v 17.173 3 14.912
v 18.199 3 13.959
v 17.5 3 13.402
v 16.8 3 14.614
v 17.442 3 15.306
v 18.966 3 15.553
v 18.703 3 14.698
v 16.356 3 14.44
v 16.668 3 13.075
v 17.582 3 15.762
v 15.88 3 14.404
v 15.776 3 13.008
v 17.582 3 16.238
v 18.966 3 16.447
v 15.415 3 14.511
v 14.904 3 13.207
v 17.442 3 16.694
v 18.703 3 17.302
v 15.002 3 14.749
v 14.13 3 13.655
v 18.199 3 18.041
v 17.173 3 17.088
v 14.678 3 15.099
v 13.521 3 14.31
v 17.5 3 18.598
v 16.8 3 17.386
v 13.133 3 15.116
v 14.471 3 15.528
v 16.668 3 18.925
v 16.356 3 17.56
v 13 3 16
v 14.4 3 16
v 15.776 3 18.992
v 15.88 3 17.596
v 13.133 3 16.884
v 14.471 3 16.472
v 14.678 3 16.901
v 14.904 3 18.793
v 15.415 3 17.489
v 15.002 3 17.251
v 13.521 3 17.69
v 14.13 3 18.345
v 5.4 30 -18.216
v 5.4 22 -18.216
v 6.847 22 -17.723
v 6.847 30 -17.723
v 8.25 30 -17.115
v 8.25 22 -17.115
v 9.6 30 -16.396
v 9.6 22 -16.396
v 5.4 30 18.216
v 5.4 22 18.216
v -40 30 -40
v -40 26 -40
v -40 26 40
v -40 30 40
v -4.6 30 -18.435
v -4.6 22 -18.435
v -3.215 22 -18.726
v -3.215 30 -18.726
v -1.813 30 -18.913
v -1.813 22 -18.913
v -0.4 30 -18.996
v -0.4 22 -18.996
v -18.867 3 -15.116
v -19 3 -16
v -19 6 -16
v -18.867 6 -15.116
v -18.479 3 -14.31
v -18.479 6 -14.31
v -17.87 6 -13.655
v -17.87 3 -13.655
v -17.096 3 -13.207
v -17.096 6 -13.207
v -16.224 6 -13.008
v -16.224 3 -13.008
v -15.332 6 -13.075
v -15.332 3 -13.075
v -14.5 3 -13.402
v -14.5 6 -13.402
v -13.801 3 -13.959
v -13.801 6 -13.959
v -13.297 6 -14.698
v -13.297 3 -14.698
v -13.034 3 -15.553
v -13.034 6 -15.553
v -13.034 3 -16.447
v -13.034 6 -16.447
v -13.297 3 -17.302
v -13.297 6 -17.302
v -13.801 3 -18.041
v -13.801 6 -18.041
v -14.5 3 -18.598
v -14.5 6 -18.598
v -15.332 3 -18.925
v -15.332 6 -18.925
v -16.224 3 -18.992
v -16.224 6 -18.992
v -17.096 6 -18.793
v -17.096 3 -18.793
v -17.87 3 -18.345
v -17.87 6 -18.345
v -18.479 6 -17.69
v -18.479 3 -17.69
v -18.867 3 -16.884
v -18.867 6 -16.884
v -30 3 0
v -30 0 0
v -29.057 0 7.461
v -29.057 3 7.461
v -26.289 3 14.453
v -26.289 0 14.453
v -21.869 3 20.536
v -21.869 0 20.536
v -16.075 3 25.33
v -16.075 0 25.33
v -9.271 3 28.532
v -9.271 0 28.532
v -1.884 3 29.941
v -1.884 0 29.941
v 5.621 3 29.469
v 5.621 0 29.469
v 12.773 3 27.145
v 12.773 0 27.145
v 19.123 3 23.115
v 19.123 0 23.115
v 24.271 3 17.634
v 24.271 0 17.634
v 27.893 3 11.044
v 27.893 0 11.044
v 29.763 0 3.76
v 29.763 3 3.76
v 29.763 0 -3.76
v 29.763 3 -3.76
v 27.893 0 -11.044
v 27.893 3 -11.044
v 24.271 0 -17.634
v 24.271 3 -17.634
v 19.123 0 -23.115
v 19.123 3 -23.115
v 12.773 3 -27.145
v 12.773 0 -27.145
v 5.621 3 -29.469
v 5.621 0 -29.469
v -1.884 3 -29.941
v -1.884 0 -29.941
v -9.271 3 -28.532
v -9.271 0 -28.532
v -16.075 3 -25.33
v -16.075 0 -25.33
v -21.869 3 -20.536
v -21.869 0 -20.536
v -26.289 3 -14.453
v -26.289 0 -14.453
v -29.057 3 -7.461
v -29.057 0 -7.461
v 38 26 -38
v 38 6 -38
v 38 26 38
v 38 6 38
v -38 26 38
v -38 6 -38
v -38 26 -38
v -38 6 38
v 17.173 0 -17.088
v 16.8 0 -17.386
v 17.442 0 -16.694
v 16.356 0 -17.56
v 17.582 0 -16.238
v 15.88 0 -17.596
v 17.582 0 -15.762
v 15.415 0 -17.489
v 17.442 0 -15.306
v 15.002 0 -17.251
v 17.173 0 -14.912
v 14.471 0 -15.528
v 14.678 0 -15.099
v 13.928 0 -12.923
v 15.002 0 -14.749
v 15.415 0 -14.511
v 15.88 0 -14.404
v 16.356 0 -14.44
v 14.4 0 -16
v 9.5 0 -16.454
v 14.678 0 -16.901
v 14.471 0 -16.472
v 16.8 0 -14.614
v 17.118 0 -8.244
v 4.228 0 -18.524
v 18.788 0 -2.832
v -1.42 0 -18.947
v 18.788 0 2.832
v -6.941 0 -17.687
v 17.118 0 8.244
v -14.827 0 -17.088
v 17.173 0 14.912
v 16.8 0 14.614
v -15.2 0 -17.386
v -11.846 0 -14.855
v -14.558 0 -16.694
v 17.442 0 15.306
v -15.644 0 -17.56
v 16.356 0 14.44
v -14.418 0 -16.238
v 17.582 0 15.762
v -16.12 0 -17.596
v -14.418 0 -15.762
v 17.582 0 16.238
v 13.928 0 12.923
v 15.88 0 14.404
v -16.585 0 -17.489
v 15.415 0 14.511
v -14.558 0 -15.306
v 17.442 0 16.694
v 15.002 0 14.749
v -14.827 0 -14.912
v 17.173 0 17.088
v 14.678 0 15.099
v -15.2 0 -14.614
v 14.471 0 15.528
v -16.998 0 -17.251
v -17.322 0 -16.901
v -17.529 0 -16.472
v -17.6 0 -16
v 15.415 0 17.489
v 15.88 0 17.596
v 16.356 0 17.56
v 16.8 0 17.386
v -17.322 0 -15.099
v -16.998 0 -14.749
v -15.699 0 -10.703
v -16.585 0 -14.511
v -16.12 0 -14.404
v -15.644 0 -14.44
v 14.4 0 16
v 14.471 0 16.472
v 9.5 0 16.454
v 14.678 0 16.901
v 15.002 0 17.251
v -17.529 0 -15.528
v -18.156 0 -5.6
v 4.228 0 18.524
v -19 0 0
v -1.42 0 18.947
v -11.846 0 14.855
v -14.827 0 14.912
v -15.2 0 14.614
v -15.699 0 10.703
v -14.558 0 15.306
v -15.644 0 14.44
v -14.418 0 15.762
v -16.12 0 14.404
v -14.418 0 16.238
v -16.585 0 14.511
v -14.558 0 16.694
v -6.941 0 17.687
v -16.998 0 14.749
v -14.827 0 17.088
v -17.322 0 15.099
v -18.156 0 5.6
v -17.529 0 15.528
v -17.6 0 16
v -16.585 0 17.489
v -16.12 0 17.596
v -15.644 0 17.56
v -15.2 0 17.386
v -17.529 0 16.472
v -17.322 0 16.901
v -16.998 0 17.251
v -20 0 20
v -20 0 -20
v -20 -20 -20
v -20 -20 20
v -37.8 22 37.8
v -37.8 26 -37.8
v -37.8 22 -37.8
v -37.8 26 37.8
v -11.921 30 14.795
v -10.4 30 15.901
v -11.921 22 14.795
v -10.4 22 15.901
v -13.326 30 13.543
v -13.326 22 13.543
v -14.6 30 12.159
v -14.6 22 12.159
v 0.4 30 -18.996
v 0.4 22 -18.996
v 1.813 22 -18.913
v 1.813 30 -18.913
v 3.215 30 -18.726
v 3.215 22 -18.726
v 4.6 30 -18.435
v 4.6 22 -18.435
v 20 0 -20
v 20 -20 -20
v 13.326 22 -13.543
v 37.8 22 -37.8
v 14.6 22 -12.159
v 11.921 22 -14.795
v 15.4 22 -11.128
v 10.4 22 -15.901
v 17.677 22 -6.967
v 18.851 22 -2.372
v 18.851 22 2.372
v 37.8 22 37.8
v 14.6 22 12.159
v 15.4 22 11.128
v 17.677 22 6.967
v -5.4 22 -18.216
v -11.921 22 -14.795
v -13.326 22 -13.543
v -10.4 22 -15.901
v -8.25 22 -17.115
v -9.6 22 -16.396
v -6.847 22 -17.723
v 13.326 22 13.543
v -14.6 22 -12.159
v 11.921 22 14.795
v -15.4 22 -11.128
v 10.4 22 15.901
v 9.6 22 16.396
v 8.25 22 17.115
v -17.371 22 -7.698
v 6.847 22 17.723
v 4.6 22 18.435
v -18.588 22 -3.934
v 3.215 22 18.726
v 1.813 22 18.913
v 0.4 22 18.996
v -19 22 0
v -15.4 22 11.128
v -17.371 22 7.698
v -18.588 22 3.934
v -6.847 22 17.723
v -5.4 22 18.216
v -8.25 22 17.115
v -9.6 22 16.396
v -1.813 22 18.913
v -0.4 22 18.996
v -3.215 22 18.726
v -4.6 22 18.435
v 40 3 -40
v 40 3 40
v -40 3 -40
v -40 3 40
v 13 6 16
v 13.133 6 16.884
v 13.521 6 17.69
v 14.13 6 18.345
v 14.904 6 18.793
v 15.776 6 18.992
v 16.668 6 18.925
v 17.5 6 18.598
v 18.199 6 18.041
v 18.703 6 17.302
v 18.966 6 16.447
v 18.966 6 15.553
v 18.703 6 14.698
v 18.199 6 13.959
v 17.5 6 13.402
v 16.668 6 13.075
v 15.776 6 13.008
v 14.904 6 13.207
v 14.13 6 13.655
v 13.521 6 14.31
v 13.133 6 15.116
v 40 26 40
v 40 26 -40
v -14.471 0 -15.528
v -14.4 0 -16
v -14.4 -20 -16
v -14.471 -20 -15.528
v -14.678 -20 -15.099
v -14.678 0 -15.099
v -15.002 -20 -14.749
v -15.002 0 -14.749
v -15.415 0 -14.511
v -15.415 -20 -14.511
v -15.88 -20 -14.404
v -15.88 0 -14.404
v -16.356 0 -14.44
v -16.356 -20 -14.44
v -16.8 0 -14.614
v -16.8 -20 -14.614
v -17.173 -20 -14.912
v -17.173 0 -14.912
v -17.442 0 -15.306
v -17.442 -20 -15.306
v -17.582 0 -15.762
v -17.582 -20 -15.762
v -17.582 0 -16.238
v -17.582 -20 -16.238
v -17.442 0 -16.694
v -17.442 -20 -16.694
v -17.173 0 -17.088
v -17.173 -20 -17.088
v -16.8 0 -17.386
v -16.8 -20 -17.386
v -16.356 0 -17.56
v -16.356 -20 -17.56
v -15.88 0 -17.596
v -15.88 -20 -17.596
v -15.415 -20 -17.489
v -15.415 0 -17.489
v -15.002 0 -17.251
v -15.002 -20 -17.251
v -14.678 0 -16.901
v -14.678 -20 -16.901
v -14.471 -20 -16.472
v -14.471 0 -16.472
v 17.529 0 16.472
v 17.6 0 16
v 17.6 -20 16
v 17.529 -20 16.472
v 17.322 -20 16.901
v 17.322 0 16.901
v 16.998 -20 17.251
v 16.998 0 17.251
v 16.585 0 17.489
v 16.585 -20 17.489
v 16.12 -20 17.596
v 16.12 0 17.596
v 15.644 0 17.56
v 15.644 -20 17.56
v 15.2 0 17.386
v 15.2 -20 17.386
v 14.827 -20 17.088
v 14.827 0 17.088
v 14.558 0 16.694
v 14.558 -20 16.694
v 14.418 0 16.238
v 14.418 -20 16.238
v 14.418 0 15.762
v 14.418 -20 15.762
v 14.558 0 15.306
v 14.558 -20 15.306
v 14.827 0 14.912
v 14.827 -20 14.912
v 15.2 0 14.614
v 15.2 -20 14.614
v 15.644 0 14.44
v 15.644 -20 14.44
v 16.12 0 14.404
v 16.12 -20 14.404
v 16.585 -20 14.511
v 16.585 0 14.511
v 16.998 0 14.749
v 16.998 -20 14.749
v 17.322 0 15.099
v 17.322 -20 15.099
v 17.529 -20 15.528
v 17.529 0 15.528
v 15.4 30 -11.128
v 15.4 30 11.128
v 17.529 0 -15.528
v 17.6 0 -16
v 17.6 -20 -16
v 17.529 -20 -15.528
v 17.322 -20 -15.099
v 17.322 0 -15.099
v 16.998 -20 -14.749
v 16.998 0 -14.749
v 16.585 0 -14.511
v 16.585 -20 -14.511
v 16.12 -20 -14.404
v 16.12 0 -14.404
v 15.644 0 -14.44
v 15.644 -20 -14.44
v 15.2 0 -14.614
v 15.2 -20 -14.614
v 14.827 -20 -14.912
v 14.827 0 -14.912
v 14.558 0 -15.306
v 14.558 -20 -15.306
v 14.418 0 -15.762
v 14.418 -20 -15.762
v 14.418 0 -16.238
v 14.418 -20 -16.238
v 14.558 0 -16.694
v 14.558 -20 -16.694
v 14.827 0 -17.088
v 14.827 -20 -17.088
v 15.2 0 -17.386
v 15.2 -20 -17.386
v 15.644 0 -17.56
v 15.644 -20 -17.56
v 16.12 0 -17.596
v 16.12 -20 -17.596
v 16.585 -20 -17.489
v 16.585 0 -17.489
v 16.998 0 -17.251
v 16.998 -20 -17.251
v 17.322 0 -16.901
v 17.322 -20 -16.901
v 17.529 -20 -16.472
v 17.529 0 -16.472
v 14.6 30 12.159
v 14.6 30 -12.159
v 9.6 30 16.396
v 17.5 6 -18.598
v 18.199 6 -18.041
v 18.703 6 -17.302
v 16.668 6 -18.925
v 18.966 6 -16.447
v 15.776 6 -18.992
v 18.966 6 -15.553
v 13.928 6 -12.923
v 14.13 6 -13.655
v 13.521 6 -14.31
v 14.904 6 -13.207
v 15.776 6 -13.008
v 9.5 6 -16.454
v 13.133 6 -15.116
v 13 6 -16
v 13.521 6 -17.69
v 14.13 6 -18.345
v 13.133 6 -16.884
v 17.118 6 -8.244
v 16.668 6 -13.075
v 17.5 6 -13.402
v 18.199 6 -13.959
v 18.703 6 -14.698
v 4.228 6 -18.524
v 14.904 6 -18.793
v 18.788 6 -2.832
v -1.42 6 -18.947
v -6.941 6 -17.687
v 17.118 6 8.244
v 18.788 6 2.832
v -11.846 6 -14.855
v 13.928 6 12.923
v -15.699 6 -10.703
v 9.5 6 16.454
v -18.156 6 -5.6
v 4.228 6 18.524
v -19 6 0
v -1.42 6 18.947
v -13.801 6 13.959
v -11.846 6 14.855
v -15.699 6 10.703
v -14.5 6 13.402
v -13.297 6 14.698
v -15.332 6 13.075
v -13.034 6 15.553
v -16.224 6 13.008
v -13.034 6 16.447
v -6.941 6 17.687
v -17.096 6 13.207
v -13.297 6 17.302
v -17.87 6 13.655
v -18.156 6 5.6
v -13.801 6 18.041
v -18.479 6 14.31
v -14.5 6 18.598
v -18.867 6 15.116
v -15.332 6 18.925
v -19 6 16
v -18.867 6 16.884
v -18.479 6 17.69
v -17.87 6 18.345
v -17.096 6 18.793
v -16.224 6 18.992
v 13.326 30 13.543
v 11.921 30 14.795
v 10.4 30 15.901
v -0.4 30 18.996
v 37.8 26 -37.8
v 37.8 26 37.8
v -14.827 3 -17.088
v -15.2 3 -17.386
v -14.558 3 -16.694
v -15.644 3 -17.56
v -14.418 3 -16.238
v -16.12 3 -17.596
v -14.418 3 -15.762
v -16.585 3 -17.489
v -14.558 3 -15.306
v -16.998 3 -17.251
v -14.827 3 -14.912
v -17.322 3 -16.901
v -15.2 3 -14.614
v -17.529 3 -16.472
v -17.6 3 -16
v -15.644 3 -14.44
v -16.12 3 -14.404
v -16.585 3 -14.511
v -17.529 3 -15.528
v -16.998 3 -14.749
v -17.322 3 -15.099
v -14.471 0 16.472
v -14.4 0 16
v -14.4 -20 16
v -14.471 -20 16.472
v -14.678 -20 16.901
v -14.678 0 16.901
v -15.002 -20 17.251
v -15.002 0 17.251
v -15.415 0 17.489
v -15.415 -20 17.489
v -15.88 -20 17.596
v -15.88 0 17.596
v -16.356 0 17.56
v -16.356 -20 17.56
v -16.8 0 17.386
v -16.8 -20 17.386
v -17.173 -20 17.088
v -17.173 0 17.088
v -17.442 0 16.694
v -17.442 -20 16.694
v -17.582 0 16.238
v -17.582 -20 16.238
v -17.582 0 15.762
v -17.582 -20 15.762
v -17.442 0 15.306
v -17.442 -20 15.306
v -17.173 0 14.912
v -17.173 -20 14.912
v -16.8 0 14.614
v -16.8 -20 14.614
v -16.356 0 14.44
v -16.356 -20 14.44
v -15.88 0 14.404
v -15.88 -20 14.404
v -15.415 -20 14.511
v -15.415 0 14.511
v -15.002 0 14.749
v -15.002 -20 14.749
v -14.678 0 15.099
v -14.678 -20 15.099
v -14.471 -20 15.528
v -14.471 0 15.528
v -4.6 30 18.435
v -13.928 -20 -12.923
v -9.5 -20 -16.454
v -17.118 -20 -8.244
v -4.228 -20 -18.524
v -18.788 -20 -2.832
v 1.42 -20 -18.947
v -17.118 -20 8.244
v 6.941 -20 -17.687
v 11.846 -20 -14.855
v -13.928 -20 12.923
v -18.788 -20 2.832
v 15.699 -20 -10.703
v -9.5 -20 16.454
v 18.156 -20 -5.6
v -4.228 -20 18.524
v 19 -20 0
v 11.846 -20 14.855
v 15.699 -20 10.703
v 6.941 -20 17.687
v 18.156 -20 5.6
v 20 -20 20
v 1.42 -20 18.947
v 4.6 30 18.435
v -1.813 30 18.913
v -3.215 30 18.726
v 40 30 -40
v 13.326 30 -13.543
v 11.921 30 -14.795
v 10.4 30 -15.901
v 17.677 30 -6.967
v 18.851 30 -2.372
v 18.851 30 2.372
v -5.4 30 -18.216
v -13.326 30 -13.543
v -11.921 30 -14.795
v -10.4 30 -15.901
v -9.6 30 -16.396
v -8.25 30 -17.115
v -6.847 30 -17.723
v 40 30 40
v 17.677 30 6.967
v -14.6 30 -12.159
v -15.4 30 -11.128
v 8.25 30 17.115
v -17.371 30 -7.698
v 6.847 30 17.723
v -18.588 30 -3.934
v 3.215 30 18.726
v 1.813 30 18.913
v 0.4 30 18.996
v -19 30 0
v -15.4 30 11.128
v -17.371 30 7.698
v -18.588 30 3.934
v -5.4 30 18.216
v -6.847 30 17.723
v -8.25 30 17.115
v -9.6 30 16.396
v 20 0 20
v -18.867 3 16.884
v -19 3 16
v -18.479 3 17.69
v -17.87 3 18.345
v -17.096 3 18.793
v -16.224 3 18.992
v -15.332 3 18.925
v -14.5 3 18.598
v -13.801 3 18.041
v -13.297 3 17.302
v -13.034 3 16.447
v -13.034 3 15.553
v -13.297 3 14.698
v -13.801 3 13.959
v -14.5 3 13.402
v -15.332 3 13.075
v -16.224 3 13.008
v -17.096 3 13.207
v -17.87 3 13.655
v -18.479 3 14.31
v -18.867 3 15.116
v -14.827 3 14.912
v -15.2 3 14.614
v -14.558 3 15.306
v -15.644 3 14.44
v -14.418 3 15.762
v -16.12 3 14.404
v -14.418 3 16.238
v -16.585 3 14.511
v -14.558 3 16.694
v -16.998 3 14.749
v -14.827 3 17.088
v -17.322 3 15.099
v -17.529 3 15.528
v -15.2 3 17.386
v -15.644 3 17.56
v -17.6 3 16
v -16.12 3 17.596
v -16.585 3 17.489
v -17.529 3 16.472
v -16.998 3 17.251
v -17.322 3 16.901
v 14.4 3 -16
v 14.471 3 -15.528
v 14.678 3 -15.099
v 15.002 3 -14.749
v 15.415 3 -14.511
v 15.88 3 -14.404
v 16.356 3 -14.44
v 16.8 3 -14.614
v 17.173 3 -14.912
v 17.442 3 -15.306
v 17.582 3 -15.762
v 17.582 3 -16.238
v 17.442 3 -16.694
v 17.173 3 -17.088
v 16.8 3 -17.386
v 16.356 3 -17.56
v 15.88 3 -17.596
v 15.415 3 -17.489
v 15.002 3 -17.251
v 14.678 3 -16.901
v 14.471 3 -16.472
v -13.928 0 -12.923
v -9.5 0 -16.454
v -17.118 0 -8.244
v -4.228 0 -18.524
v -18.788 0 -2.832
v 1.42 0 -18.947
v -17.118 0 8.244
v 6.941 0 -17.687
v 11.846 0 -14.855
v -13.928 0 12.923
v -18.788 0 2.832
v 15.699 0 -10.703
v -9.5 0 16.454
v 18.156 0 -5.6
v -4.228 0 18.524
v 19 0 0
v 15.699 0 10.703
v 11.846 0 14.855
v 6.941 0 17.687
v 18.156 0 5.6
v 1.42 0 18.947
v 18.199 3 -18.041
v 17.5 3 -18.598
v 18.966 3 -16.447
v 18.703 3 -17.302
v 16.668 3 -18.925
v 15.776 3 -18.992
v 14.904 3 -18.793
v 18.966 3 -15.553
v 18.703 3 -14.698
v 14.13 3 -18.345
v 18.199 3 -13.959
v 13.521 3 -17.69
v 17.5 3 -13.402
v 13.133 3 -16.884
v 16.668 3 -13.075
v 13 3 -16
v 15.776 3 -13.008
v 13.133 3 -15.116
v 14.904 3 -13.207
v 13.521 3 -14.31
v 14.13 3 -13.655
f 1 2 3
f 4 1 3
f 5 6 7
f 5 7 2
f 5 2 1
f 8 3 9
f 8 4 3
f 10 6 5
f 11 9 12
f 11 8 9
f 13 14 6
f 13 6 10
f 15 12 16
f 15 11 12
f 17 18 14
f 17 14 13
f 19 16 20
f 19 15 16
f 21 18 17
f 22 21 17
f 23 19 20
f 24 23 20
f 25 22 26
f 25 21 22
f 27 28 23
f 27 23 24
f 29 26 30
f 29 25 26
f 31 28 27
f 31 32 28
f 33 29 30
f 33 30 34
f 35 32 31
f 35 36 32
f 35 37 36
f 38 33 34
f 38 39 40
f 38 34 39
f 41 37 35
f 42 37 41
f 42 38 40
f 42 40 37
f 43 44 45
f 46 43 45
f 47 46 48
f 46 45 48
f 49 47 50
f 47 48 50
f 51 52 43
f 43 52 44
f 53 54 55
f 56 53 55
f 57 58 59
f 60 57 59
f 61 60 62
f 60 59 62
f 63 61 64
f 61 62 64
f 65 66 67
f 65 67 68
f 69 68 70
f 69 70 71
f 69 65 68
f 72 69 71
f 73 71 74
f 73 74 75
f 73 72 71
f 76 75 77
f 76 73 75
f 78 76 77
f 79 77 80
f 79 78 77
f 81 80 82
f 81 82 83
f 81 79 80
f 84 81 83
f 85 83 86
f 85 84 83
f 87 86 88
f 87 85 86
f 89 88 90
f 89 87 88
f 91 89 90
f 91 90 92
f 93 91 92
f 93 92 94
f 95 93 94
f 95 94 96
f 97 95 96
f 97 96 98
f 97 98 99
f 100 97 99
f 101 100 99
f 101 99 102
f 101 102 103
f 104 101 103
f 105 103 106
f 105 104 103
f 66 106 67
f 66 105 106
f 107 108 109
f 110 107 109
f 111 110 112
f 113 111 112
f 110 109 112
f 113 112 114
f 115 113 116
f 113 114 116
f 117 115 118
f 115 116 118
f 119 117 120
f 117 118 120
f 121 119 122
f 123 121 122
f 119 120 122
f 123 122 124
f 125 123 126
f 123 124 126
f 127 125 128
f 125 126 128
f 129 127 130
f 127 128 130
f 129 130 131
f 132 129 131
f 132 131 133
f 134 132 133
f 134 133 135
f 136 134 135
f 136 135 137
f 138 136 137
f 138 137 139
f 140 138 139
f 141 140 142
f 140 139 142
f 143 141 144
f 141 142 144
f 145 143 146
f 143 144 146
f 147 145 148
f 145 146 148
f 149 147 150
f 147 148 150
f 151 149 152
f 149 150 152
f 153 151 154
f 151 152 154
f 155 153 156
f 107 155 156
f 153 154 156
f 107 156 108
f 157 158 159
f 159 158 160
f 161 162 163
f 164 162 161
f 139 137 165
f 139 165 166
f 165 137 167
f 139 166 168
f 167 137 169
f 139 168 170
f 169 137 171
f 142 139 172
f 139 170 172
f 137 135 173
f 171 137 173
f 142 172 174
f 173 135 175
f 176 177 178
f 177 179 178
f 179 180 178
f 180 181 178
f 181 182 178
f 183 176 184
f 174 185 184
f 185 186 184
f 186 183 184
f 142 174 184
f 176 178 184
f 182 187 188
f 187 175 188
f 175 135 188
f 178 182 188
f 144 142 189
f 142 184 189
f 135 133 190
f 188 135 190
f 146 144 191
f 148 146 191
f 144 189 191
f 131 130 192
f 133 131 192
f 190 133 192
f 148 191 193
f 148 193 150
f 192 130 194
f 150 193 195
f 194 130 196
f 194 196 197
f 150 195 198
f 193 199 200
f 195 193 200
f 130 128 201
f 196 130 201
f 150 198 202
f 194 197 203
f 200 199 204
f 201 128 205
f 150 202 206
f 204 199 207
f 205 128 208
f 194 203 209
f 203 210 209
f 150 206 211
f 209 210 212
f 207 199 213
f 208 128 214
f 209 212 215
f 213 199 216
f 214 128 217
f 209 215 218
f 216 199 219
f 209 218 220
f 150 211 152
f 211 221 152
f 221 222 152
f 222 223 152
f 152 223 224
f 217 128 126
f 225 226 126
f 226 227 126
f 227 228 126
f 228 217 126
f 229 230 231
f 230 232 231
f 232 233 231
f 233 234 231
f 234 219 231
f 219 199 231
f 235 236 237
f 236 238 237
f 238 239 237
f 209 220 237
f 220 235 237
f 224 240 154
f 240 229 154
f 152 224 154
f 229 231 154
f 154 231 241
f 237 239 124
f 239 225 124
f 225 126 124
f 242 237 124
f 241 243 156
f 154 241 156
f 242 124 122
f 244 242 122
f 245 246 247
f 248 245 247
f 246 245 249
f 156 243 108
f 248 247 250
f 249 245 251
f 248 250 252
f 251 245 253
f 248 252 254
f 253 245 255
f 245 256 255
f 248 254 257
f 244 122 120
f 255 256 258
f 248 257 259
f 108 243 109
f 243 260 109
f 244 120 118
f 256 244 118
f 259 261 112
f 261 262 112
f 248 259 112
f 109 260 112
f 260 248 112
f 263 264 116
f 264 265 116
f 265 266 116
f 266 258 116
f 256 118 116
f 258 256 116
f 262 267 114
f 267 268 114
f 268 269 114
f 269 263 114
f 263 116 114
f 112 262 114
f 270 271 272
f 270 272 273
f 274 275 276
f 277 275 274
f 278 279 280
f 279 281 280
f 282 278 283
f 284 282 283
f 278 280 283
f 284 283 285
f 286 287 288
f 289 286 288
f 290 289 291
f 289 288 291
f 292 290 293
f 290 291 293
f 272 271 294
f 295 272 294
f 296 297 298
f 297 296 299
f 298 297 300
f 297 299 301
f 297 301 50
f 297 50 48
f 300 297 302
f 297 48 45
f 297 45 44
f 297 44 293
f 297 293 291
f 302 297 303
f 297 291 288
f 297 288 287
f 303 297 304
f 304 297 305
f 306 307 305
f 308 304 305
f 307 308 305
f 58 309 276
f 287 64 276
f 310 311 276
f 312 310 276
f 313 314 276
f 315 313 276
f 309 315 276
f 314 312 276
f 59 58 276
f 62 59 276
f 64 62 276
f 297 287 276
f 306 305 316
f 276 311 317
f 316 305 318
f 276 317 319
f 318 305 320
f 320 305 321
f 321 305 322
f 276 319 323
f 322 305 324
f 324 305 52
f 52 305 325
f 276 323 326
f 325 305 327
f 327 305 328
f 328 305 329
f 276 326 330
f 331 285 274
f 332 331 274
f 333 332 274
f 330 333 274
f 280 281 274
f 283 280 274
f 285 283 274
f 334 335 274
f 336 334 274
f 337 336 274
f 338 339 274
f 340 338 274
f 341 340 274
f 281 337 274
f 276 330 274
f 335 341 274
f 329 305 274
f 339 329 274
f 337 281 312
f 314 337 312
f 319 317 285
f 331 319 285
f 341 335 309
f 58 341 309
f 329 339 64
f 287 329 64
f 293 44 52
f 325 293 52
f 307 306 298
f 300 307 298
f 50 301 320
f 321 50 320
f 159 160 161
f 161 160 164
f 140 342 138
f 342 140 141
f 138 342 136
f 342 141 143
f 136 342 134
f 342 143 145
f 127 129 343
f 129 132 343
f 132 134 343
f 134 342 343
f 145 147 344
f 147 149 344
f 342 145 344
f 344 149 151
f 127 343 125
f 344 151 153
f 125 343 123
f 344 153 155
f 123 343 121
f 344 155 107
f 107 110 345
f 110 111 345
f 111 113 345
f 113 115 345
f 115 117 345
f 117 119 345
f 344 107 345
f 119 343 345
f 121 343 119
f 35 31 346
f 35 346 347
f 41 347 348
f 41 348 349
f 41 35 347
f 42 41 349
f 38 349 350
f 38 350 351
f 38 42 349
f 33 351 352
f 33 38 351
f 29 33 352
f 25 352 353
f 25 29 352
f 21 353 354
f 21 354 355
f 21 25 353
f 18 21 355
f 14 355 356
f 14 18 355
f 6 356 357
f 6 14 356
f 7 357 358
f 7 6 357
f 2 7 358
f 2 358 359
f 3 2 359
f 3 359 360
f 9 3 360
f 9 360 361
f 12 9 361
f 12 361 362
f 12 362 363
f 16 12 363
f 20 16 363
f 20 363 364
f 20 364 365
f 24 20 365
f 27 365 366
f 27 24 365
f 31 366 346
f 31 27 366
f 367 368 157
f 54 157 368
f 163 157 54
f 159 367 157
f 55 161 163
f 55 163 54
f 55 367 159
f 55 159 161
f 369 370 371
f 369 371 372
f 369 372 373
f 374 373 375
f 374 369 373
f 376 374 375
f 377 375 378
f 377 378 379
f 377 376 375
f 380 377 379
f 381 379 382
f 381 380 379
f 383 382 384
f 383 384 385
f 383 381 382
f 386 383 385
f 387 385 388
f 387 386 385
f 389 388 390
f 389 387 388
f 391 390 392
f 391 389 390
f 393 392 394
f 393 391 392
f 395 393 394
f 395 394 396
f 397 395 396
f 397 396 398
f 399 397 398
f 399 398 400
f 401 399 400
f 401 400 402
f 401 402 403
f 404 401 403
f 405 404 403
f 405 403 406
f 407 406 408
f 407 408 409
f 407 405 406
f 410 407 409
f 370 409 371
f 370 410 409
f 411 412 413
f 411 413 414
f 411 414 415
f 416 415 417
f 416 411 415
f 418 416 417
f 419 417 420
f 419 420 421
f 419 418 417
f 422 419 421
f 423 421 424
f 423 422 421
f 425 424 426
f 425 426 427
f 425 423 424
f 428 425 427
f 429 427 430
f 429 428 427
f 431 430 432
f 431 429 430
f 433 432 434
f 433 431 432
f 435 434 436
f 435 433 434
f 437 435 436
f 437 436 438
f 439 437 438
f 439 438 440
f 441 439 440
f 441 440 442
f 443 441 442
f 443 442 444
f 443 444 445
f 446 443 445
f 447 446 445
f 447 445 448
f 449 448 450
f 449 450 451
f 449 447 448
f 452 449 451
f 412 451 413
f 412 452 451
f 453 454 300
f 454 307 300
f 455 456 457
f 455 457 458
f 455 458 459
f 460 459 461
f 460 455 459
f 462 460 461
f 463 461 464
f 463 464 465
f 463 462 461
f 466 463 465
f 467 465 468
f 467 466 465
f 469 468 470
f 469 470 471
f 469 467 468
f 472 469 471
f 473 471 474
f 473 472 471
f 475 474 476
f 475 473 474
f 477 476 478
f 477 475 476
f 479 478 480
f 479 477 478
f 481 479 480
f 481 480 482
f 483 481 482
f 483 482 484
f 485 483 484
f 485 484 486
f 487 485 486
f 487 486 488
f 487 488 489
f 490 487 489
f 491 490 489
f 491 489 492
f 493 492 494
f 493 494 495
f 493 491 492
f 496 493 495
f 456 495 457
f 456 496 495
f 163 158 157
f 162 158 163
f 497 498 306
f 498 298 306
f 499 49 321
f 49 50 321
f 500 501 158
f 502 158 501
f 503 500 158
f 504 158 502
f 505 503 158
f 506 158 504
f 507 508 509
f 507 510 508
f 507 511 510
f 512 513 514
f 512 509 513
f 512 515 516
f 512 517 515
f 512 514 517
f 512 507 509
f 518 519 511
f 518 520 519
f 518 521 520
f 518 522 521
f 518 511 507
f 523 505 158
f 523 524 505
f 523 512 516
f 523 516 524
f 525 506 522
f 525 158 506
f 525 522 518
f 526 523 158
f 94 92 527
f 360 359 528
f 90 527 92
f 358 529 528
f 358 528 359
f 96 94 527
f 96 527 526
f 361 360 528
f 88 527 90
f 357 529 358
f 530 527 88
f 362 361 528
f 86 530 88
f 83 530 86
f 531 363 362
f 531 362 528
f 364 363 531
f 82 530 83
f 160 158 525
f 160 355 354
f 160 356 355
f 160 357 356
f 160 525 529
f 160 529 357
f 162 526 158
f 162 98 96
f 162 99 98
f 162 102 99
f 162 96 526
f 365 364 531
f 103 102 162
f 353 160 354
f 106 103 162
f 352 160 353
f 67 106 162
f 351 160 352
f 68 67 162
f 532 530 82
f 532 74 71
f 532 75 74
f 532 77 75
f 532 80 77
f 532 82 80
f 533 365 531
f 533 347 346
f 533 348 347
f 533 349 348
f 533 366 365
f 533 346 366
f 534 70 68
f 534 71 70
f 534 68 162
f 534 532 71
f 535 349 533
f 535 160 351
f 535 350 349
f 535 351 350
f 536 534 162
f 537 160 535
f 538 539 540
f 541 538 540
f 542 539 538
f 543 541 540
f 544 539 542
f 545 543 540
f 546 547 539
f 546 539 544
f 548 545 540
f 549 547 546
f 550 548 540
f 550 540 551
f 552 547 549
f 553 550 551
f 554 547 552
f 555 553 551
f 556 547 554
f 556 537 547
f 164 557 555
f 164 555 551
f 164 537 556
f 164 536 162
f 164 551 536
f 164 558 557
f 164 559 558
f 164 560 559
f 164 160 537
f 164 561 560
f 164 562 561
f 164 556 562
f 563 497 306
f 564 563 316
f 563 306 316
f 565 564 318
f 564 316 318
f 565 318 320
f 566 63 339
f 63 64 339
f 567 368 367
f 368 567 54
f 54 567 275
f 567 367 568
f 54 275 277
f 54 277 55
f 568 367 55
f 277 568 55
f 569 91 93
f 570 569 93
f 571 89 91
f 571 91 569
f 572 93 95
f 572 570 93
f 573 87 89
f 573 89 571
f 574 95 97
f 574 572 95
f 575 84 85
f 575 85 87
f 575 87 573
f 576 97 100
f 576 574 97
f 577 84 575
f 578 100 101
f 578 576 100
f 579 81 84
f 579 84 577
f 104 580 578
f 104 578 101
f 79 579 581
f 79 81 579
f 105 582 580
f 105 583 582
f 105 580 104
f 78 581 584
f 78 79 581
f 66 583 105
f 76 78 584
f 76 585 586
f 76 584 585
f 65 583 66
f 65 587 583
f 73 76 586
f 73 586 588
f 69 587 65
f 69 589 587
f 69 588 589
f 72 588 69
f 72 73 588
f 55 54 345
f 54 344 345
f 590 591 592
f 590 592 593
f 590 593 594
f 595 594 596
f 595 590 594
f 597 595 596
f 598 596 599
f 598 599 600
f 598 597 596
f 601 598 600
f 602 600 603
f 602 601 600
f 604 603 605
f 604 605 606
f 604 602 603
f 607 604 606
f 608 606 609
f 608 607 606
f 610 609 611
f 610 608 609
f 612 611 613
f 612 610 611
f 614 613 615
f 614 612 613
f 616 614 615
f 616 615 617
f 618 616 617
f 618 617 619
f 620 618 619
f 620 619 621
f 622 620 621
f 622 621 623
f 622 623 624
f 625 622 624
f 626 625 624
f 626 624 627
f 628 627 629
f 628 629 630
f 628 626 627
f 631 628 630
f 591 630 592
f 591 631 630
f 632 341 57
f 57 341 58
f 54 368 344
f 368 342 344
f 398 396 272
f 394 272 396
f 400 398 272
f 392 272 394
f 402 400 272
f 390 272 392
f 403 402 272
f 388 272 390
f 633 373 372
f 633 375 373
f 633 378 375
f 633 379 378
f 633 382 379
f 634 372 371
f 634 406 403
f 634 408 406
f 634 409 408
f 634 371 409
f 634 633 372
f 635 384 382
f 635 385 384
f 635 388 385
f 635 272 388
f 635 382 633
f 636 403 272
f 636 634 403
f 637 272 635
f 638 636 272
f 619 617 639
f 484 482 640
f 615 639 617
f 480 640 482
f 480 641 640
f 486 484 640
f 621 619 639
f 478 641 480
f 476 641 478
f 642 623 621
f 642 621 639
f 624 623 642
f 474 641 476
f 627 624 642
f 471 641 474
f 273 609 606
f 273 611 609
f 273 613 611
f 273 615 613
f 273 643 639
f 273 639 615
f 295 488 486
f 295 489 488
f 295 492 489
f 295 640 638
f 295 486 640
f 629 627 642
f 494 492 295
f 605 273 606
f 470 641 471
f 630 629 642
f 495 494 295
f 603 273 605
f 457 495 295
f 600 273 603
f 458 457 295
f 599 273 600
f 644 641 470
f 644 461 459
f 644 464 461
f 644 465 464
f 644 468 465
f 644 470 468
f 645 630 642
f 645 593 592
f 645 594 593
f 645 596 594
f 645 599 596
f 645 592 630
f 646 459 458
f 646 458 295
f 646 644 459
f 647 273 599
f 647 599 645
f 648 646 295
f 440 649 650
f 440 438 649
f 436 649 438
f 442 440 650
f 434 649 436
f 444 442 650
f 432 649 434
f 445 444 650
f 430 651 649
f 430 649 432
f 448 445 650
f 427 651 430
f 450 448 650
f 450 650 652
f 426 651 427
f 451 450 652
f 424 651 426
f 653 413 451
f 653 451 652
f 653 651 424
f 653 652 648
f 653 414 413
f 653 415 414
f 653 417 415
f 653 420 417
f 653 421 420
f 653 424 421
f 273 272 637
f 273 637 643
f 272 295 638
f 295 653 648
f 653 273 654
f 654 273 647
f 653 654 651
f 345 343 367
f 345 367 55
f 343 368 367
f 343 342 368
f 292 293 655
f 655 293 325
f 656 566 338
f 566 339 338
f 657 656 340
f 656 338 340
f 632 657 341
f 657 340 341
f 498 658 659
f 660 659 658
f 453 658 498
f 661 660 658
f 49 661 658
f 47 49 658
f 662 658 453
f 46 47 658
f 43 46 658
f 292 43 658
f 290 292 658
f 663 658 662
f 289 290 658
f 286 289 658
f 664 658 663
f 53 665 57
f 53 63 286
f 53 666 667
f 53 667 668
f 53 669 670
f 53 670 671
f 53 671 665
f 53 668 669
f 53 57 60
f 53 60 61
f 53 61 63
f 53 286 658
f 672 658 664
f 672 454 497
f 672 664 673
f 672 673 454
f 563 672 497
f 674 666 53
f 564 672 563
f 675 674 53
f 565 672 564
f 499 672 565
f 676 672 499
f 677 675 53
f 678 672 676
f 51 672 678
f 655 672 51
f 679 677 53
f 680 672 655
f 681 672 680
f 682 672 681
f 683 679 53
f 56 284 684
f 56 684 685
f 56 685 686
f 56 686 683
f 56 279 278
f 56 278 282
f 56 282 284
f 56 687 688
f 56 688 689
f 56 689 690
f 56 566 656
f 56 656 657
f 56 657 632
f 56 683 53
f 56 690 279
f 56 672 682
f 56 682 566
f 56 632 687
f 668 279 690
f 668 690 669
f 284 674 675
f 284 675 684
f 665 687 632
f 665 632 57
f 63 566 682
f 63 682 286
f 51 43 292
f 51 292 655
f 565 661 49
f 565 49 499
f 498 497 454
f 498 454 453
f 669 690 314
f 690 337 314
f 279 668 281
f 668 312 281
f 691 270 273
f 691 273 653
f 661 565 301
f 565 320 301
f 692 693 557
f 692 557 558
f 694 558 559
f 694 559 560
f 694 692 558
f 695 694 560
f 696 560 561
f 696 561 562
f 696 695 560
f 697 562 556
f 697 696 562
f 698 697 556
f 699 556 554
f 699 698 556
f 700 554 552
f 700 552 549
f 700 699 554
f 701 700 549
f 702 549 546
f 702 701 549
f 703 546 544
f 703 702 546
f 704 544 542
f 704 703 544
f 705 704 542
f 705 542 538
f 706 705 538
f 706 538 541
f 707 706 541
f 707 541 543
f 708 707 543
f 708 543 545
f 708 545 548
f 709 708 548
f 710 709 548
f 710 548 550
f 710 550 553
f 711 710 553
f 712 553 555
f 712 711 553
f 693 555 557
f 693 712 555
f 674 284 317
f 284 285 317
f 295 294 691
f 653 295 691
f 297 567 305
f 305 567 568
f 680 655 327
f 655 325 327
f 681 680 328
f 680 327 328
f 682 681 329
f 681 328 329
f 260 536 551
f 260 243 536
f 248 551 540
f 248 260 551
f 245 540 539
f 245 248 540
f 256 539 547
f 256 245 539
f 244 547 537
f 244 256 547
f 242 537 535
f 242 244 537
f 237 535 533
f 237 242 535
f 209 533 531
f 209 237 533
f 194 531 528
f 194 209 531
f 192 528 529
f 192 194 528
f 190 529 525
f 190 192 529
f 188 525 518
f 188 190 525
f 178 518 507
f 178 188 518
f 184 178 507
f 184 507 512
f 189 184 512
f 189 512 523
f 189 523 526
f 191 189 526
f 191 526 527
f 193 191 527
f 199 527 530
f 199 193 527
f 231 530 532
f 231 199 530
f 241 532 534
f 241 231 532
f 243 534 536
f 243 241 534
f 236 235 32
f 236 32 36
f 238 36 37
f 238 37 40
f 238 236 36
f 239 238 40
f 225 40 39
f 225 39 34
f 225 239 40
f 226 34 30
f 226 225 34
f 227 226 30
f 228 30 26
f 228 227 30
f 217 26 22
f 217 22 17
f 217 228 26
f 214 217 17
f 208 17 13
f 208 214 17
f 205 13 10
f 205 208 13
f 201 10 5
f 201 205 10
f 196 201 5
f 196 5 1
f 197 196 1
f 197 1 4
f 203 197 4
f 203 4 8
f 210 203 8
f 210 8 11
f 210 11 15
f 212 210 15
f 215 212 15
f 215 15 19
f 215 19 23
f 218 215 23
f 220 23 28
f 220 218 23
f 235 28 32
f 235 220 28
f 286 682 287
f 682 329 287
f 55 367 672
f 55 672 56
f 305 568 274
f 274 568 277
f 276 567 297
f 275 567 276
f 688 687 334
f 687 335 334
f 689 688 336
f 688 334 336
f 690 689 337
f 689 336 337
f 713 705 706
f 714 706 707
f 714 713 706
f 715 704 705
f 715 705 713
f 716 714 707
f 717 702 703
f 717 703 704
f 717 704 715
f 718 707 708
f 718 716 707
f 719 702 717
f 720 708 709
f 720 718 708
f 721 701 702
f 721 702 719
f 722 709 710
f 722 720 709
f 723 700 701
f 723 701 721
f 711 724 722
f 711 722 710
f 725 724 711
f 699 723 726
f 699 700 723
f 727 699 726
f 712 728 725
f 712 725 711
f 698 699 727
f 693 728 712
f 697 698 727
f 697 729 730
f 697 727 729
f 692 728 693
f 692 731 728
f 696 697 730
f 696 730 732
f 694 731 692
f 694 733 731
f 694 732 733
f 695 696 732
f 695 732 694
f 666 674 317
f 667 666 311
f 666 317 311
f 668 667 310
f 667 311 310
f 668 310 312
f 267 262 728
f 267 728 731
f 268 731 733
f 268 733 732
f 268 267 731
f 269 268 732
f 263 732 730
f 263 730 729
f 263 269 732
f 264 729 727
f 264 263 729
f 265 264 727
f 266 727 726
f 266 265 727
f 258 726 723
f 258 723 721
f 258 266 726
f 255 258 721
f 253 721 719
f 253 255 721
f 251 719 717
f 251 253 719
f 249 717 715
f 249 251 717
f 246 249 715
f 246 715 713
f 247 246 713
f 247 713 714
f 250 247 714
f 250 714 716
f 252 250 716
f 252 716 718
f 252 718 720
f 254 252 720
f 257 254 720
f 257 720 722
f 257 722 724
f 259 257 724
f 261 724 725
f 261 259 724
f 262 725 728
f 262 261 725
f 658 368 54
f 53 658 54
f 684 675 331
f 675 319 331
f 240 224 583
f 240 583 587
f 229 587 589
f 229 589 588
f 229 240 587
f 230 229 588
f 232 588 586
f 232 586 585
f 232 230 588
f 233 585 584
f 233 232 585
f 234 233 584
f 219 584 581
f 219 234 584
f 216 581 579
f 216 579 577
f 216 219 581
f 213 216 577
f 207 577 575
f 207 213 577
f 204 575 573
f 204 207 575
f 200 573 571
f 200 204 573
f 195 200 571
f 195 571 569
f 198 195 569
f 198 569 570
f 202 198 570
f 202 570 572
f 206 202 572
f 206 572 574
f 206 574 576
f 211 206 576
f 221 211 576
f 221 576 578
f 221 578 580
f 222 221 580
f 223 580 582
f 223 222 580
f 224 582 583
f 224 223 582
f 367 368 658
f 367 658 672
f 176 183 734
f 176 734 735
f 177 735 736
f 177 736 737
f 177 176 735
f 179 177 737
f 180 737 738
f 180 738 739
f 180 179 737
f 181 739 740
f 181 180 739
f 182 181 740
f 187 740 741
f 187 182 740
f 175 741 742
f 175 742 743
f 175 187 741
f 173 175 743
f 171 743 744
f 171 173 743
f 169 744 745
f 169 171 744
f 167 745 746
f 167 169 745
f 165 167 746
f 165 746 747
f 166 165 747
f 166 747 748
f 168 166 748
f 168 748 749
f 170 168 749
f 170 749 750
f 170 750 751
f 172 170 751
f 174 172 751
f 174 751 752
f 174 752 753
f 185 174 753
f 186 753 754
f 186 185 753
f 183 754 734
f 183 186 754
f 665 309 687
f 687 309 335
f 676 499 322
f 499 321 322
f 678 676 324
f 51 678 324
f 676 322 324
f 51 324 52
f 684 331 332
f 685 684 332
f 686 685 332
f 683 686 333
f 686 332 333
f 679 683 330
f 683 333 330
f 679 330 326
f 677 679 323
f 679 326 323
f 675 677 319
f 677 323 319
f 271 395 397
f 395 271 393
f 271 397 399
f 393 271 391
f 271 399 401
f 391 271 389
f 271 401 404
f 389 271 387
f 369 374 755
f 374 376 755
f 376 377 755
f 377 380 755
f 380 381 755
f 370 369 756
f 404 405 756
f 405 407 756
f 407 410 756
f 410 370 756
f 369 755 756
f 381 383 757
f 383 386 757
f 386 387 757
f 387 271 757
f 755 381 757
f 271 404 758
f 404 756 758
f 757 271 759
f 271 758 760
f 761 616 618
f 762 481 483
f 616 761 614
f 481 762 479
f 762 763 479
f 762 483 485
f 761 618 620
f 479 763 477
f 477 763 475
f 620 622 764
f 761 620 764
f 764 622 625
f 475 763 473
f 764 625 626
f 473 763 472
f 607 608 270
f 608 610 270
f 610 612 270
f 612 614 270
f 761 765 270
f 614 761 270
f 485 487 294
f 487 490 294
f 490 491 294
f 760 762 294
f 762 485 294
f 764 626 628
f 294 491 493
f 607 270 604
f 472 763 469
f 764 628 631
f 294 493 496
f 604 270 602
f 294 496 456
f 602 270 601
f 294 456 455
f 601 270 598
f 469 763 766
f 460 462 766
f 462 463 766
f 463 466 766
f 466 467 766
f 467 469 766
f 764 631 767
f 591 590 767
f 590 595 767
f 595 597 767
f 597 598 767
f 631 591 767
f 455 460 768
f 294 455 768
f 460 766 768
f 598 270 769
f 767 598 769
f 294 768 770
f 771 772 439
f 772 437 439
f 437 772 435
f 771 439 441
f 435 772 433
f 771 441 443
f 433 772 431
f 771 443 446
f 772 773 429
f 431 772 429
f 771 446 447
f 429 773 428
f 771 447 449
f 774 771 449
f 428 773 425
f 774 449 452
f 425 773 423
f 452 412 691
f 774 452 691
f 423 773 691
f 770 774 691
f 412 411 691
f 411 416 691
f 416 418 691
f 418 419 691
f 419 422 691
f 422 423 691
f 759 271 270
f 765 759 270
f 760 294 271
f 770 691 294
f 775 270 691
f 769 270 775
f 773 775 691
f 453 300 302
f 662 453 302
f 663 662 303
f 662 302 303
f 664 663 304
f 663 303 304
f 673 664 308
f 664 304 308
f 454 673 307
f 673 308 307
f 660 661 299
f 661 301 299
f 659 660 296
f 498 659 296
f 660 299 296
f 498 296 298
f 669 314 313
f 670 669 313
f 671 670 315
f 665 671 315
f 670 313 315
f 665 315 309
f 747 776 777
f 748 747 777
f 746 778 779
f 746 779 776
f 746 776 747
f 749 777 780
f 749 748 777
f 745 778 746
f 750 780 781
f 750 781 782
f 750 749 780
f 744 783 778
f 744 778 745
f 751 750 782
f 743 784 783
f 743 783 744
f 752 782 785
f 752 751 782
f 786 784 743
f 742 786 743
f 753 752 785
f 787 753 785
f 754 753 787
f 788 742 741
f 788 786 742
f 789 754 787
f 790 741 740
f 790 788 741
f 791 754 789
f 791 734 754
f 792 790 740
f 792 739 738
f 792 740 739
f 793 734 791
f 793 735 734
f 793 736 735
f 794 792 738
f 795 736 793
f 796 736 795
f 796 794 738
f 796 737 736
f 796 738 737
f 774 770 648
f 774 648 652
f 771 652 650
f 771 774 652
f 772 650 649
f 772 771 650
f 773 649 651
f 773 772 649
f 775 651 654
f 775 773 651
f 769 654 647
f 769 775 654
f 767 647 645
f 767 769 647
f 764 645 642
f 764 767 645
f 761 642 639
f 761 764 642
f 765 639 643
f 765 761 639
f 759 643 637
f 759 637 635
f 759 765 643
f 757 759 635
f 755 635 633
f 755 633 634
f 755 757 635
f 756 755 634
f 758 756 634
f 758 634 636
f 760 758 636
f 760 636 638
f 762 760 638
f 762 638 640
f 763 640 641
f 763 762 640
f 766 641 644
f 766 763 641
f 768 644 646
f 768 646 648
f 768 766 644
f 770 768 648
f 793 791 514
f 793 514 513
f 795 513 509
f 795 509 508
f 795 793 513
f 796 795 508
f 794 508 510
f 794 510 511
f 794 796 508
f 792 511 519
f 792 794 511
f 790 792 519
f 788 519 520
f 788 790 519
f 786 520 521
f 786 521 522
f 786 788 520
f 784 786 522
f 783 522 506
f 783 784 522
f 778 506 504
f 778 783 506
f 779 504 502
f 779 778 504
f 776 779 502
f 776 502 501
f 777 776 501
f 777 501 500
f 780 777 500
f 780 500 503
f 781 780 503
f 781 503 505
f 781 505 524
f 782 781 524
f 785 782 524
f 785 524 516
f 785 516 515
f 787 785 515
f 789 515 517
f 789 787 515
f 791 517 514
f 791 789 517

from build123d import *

# Parameters (mm, degrees)
F0_W      = 40
F0_H      = 40
F0_R      = 1.6
F0_R_2    = 19
F1_DEPTH  = 20
F2_R      = 30
F2_W      = 40
F2_H      = 40
F2_R_2    = 1.6
F2_R_3    = 19
F3_DEPTH  = 3
F4_W      = 80
F4_H      = 80
F4_R      = 30
F4_R_2    = 3
F4_R_3    = 19
F5_DEPTH  = 3
F6_W      = 80
F6_H      = 80
F6_W_2    = 76.0000017285
F6_H_2    = 76.0000017285
F7_DEPTH  = 20
F8_W      = 75.600002408
F8_H      = 75.600002408
F9_DEPTH  = 4
F8_W_2    = 80
F8_H_2    = 80
F8_W_3    = 76.0000017285
F8_H_3    = 76.0000017285
F10_DEPTH = 4


# Not quite as in the source:
# - a feature names something its author has since deleted; it is built from what else it names


with BuildPart() as f1:
    # F0 (on Front) → F1 (new body)
    with BuildSketch(Plane.XZ):
        Rectangle(F0_W, F0_H)
        with Locations((-16, -16)):
            Circle(F0_R, mode=Mode.SUBTRACT)
        with Locations((16, -16)):
            Circle(F0_R, mode=Mode.SUBTRACT)
        with Locations((-16, 16)):
            Circle(F0_R, mode=Mode.SUBTRACT)
        Circle(F0_R_2, mode=Mode.SUBTRACT)
        with Locations((16, 16)):
            Circle(F0_R, mode=Mode.SUBTRACT)
    extrude(amount=F1_DEPTH)


with BuildPart() as f3:
    # F2 (on face) → F3 (new body)
    with BuildSketch(Plane(origin=(0, 0, 0), x_dir=(-1, 0, 0), z_dir=(0, 1, 0))):
        Circle(F2_R)
        Rectangle(F2_W, F2_H, mode=Mode.SUBTRACT)
        Rectangle(F2_W, F2_H)
        with Locations((-16, -16)):
            Circle(F2_R_2, mode=Mode.SUBTRACT)
        with Locations((16, -16)):
            Circle(F2_R_2, mode=Mode.SUBTRACT)
        with Locations((-16, 16)):
            Circle(F2_R_2, mode=Mode.SUBTRACT)
        Circle(F2_R_3, mode=Mode.SUBTRACT)
        with Locations((16, 16)):
            Circle(F2_R_2, mode=Mode.SUBTRACT)
    extrude(amount=F3_DEPTH)

    # F4 (on face) → F5 (join)
    with BuildSketch(Plane(origin=(0, 3, 0), x_dir=(-1, 0, 0), z_dir=(0, 1, 0))):
        Rectangle(F4_W, F4_H)
        Circle(F4_R, mode=Mode.SUBTRACT)
        Circle(F4_R)
        with Locations((-16, -16)):
            Circle(F4_R_2, mode=Mode.SUBTRACT)
        with Locations((16, -16)):
            Circle(F4_R_2, mode=Mode.SUBTRACT)
        with Locations((-16, 16)):
            Circle(F4_R_2, mode=Mode.SUBTRACT)
        Circle(F4_R_3, mode=Mode.SUBTRACT)
        with Locations((16, 16)):
            Circle(F4_R_2, mode=Mode.SUBTRACT)
    extrude(amount=F5_DEPTH)

    # F6 (on face) → F7 (join)
    with BuildSketch(Plane(origin=(0, 6, 0), x_dir=(-1, 0, 0), z_dir=(0, 1, 0))):
        Rectangle(F6_W, F6_H)
        Rectangle(F6_W_2, F6_H_2, mode=Mode.SUBTRACT)
    extrude(amount=F7_DEPTH)


with BuildPart() as f9:
    # F8 (on face) → F9 (new body)
    with BuildSketch(Plane(origin=(0, 26, 0), x_dir=(-1, 0, 0), z_dir=(0, 1, 0))):
        Rectangle(F8_W, F8_H)
        with BuildLine():
            ThreePointArc((15.4, 11.1283421946), (18.0776104616, 5.8480766069), (19, 0))
            ThreePointArc((19, 0), (18.0776104616, -5.8480766069), (15.4, -11.1283421946))
            ThreePointArc((15.4, -11.1283421946), (15.0088486145, -11.6505134336), (14.6, -12.1589473229))
            ThreePointArc((14.6, -12.1589473229), (12.6392497246, -14.1862386276), (10.4, -15.9009433682))
            ThreePointArc((10.4, -15.9009433682), (10.0030672654, -16.153595429), (9.6, -16.3963410552))
            ThreePointArc((9.6, -16.3963410552), (7.5550130945, -17.4333524356), (5.4, -18.2164760588))
            ThreePointArc((5.4, -18.2164760588), (5.0011909438, -18.3299778817), (4.6, -18.4347497949))
            ThreePointArc((4.6, -18.4347497949), (2.5156890208, -18.8327191014), (0.4, -18.995789007))
            ThreePointArc((0.4, -18.995789007), (0, -19), (-0.4, -18.995789007))
            ThreePointArc((-0.4, -18.995789007), (-2.5156890208, -18.8327191014), (-4.6, -18.4347497949))
            ThreePointArc((-4.6, -18.4347497949), (-5.0011909438, -18.3299778817), (-5.4, -18.2164760588))
            ThreePointArc((-5.4, -18.2164760588), (-7.5550130945, -17.4333524356), (-9.6, -16.3963410552))
            ThreePointArc((-9.6, -16.3963410552), (-10.0030672654, -16.153595429), (-10.4, -15.9009433682))
            ThreePointArc((-10.4, -15.9009433682), (-12.6392497246, -14.1862386276), (-14.6, -12.1589473229))
            ThreePointArc((-14.6, -12.1589473229), (-15.0088486145, -11.6505134336), (-15.4, -11.1283421946))
            ThreePointArc((-15.4, -11.1283421946), (-19, 0), (-15.4, 11.1283421946))
            ThreePointArc((-15.4, 11.1283421946), (-15.0088486145, 11.6505134336), (-14.6, 12.1589473229))
            ThreePointArc((-14.6, 12.1589473229), (-12.6392497246, 14.1862386276), (-10.4, 15.9009433682))
            ThreePointArc((-10.4, 15.9009433682), (-10.0030672654, 16.153595429), (-9.6, 16.3963410552))
            ThreePointArc((-9.6, 16.3963410552), (-7.5550130945, 17.4333524356), (-5.4, 18.2164760588))
            ThreePointArc((-5.4, 18.2164760588), (-5.0011909438, 18.3299778817), (-4.6, 18.4347497949))
            ThreePointArc((-4.6, 18.4347497949), (-2.5156890208, 18.8327191014), (-0.4, 18.995789007))
            ThreePointArc((-0.4, 18.995789007), (0, 19), (0.4, 18.995789007))
            ThreePointArc((0.4, 18.995789007), (2.5156890208, 18.8327191014), (4.6, 18.4347497949))
            ThreePointArc((4.6, 18.4347497949), (5.0011909438, 18.3299778817), (5.4, 18.2164760588))
            ThreePointArc((5.4, 18.2164760588), (7.5550130945, 17.4333524356), (9.6, 16.3963410552))
            ThreePointArc((9.6, 16.3963410552), (10.0030672654, 16.153595429), (10.4, 15.9009433682))
            ThreePointArc((10.4, 15.9009433682), (12.6392497246, 14.1862386276), (14.6, 12.1589473229))
            ThreePointArc((14.6, 12.1589473229), (15.0088486145, 11.6505134336), (15.4, 11.1283421946))
        make_face(mode=Mode.SUBTRACT)
        with BuildLine():
            Line((-14.6, -12.1589473229), (-14.6, 12.1589473229))
            ThreePointArc((-14.6, 12.1589473229), (-15.0088486145, 11.6505134336), (-15.4, 11.1283421946))
            Line((-15.4, 11.1283421946), (-15.4, -11.1283421946))
            ThreePointArc((-15.4, -11.1283421946), (-15.0088486145, -11.6505134336), (-14.6, -12.1589473229))
        make_face()
        with BuildLine():
            Line((-9.6, -16.3963410552), (-9.6, 16.3963410552))
            ThreePointArc((-9.6, 16.3963410552), (-10.0030672654, 16.153595429), (-10.4, 15.9009433682))
            Line((-10.4, 15.9009433682), (-10.4, -15.9009433682))
            ThreePointArc((-10.4, -15.9009433682), (-10.0030672654, -16.153595429), (-9.6, -16.3963410552))
        make_face()
        with BuildLine():
            Line((-4.6, -18.4347497949), (-4.6, 18.4347497949))
            ThreePointArc((-4.6, 18.4347497949), (-5.0011909438, 18.3299778817), (-5.4, 18.2164760588))
            Line((-5.4, 18.2164760588), (-5.4, -18.2164760588))
            ThreePointArc((-5.4, -18.2164760588), (-5.0011909438, -18.3299778817), (-4.6, -18.4347497949))
        make_face()
        with BuildLine():
            Line((0.4, -18.995789007), (0.4, 18.995789007))
            ThreePointArc((0.4, 18.995789007), (0, 19), (-0.4, 18.995789007))
            Line((-0.4, 18.995789007), (-0.4, -18.995789007))
            ThreePointArc((-0.4, -18.995789007), (0, -19), (0.4, -18.995789007))
        make_face()
        with BuildLine():
            Line((5.4, -18.2164760588), (5.4, 18.2164760588))
            ThreePointArc((5.4, 18.2164760588), (5.0011909438, 18.3299778817), (4.6, 18.4347497949))
            Line((4.6, 18.4347497949), (4.6, -18.4347497949))
            ThreePointArc((4.6, -18.4347497949), (5.0011909438, -18.3299778817), (5.4, -18.2164760588))
        make_face()
        with BuildLine():
            Line((10.4, -15.9009433682), (10.4, 15.9009433682))
            ThreePointArc((10.4, 15.9009433682), (10.0030672654, 16.153595429), (9.6, 16.3963410552))
            Line((9.6, 16.3963410552), (9.6, -16.3963410552))
            ThreePointArc((9.6, -16.3963410552), (10.0030672654, -16.153595429), (10.4, -15.9009433682))
        make_face()
        with BuildLine():
            Line((15.4, -11.1283421946), (15.4, 11.1283421946))
            ThreePointArc((15.4, 11.1283421946), (15.0088486145, 11.6505134336), (14.6, 12.1589473229))
            Line((14.6, 12.1589473229), (14.6, -12.1589473229))
            ThreePointArc((14.6, -12.1589473229), (15.0088486145, -11.6505134336), (15.4, -11.1283421946))
        make_face()
    extrude(amount=-F9_DEPTH)

    # F8 (on face) → F10 (join)
    with BuildSketch(Plane(origin=(0, 26, 0), x_dir=(-1, 0, 0), z_dir=(0, 1, 0))):
        Rectangle(F8_W_2, F8_H_2)
        Rectangle(F8_W_3, F8_H_3, mode=Mode.SUBTRACT)
        Rectangle(F8_W_3, F8_H_3)
        Rectangle(F8_W, F8_H, mode=Mode.SUBTRACT)
        Rectangle(F8_W, F8_H)
        with BuildLine():
            ThreePointArc((15.4, 11.1283421946), (18.0776104616, 5.8480766069), (19, 0))
            ThreePointArc((19, 0), (18.0776104616, -5.8480766069), (15.4, -11.1283421946))
            ThreePointArc((15.4, -11.1283421946), (15.0088486145, -11.6505134336), (14.6, -12.1589473229))
            ThreePointArc((14.6, -12.1589473229), (12.6392497246, -14.1862386276), (10.4, -15.9009433682))
            ThreePointArc((10.4, -15.9009433682), (10.0030672654, -16.153595429), (9.6, -16.3963410552))
            ThreePointArc((9.6, -16.3963410552), (7.5550130945, -17.4333524356), (5.4, -18.2164760588))
            ThreePointArc((5.4, -18.2164760588), (5.0011909438, -18.3299778817), (4.6, -18.4347497949))
            ThreePointArc((4.6, -18.4347497949), (2.5156890208, -18.8327191014), (0.4, -18.995789007))
            ThreePointArc((0.4, -18.995789007), (0, -19), (-0.4, -18.995789007))
            ThreePointArc((-0.4, -18.995789007), (-2.5156890208, -18.8327191014), (-4.6, -18.4347497949))
            ThreePointArc((-4.6, -18.4347497949), (-5.0011909438, -18.3299778817), (-5.4, -18.2164760588))
            ThreePointArc((-5.4, -18.2164760588), (-7.5550130945, -17.4333524356), (-9.6, -16.3963410552))
            ThreePointArc((-9.6, -16.3963410552), (-10.0030672654, -16.153595429), (-10.4, -15.9009433682))
            ThreePointArc((-10.4, -15.9009433682), (-12.6392497246, -14.1862386276), (-14.6, -12.1589473229))
            ThreePointArc((-14.6, -12.1589473229), (-15.0088486145, -11.6505134336), (-15.4, -11.1283421946))
            ThreePointArc((-15.4, -11.1283421946), (-19, 0), (-15.4, 11.1283421946))
            ThreePointArc((-15.4, 11.1283421946), (-15.0088486145, 11.6505134336), (-14.6, 12.1589473229))
            ThreePointArc((-14.6, 12.1589473229), (-12.6392497246, 14.1862386276), (-10.4, 15.9009433682))
            ThreePointArc((-10.4, 15.9009433682), (-10.0030672654, 16.153595429), (-9.6, 16.3963410552))
            ThreePointArc((-9.6, 16.3963410552), (-7.5550130945, 17.4333524356), (-5.4, 18.2164760588))
            ThreePointArc((-5.4, 18.2164760588), (-5.0011909438, 18.3299778817), (-4.6, 18.4347497949))
            ThreePointArc((-4.6, 18.4347497949), (-2.5156890208, 18.8327191014), (-0.4, 18.995789007))
            ThreePointArc((-0.4, 18.995789007), (0, 19), (0.4, 18.995789007))
            ThreePointArc((0.4, 18.995789007), (2.5156890208, 18.8327191014), (4.6, 18.4347497949))
            ThreePointArc((4.6, 18.4347497949), (5.0011909438, 18.3299778817), (5.4, 18.2164760588))
            ThreePointArc((5.4, 18.2164760588), (7.5550130945, 17.4333524356), (9.6, 16.3963410552))
            ThreePointArc((9.6, 16.3963410552), (10.0030672654, 16.153595429), (10.4, 15.9009433682))
            ThreePointArc((10.4, 15.9009433682), (12.6392497246, 14.1862386276), (14.6, 12.1589473229))
            ThreePointArc((14.6, 12.1589473229), (15.0088486145, 11.6505134336), (15.4, 11.1283421946))
        make_face(mode=Mode.SUBTRACT)
        with BuildLine():
            Line((-9.6, -16.3963410552), (-9.6, 16.3963410552))
            ThreePointArc((-9.6, 16.3963410552), (-10.0030672654, 16.153595429), (-10.4, 15.9009433682))
            Line((-10.4, 15.9009433682), (-10.4, -15.9009433682))
            ThreePointArc((-10.4, -15.9009433682), (-10.0030672654, -16.153595429), (-9.6, -16.3963410552))
        make_face()
        with BuildLine():
            Line((-14.6, -12.1589473229), (-14.6, 12.1589473229))
            ThreePointArc((-14.6, 12.1589473229), (-15.0088486145, 11.6505134336), (-15.4, 11.1283421946))
            Line((-15.4, 11.1283421946), (-15.4, -11.1283421946))
            ThreePointArc((-15.4, -11.1283421946), (-15.0088486145, -11.6505134336), (-14.6, -12.1589473229))
        make_face()
        with BuildLine():
            Line((-4.6, -18.4347497949), (-4.6, 18.4347497949))
            ThreePointArc((-4.6, 18.4347497949), (-5.0011909438, 18.3299778817), (-5.4, 18.2164760588))
            Line((-5.4, 18.2164760588), (-5.4, -18.2164760588))
            ThreePointArc((-5.4, -18.2164760588), (-5.0011909438, -18.3299778817), (-4.6, -18.4347497949))
        make_face()
        with BuildLine():
            Line((0.4, -18.995789007), (0.4, 18.995789007))
            ThreePointArc((0.4, 18.995789007), (0, 19), (-0.4, 18.995789007))
            Line((-0.4, 18.995789007), (-0.4, -18.995789007))
            ThreePointArc((-0.4, -18.995789007), (0, -19), (0.4, -18.995789007))
        make_face()
        with BuildLine():
            Line((5.4, -18.2164760588), (5.4, 18.2164760588))
            ThreePointArc((5.4, 18.2164760588), (5.0011909438, 18.3299778817), (4.6, 18.4347497949))
            Line((4.6, 18.4347497949), (4.6, -18.4347497949))
            ThreePointArc((4.6, -18.4347497949), (5.0011909438, -18.3299778817), (5.4, -18.2164760588))
        make_face()
        with BuildLine():
            Line((10.4, -15.9009433682), (10.4, 15.9009433682))
            ThreePointArc((10.4, 15.9009433682), (10.0030672654, 16.153595429), (9.6, 16.3963410552))
            Line((9.6, 16.3963410552), (9.6, -16.3963410552))
            ThreePointArc((9.6, -16.3963410552), (10.0030672654, -16.153595429), (10.4, -15.9009433682))
        make_face()
        with BuildLine():
            Line((15.4, -11.1283421946), (15.4, 11.1283421946))
            ThreePointArc((15.4, 11.1283421946), (15.0088486145, 11.6505134336), (14.6, 12.1589473229))
            Line((14.6, 12.1589473229), (14.6, -12.1589473229))
            ThreePointArc((14.6, -12.1589473229), (15.0088486145, -11.6505134336), (15.4, -11.1283421946))
        make_face()
    extrude(amount=F10_DEPTH)


solid = Compound([f1.part, f3.part, f9.part])
